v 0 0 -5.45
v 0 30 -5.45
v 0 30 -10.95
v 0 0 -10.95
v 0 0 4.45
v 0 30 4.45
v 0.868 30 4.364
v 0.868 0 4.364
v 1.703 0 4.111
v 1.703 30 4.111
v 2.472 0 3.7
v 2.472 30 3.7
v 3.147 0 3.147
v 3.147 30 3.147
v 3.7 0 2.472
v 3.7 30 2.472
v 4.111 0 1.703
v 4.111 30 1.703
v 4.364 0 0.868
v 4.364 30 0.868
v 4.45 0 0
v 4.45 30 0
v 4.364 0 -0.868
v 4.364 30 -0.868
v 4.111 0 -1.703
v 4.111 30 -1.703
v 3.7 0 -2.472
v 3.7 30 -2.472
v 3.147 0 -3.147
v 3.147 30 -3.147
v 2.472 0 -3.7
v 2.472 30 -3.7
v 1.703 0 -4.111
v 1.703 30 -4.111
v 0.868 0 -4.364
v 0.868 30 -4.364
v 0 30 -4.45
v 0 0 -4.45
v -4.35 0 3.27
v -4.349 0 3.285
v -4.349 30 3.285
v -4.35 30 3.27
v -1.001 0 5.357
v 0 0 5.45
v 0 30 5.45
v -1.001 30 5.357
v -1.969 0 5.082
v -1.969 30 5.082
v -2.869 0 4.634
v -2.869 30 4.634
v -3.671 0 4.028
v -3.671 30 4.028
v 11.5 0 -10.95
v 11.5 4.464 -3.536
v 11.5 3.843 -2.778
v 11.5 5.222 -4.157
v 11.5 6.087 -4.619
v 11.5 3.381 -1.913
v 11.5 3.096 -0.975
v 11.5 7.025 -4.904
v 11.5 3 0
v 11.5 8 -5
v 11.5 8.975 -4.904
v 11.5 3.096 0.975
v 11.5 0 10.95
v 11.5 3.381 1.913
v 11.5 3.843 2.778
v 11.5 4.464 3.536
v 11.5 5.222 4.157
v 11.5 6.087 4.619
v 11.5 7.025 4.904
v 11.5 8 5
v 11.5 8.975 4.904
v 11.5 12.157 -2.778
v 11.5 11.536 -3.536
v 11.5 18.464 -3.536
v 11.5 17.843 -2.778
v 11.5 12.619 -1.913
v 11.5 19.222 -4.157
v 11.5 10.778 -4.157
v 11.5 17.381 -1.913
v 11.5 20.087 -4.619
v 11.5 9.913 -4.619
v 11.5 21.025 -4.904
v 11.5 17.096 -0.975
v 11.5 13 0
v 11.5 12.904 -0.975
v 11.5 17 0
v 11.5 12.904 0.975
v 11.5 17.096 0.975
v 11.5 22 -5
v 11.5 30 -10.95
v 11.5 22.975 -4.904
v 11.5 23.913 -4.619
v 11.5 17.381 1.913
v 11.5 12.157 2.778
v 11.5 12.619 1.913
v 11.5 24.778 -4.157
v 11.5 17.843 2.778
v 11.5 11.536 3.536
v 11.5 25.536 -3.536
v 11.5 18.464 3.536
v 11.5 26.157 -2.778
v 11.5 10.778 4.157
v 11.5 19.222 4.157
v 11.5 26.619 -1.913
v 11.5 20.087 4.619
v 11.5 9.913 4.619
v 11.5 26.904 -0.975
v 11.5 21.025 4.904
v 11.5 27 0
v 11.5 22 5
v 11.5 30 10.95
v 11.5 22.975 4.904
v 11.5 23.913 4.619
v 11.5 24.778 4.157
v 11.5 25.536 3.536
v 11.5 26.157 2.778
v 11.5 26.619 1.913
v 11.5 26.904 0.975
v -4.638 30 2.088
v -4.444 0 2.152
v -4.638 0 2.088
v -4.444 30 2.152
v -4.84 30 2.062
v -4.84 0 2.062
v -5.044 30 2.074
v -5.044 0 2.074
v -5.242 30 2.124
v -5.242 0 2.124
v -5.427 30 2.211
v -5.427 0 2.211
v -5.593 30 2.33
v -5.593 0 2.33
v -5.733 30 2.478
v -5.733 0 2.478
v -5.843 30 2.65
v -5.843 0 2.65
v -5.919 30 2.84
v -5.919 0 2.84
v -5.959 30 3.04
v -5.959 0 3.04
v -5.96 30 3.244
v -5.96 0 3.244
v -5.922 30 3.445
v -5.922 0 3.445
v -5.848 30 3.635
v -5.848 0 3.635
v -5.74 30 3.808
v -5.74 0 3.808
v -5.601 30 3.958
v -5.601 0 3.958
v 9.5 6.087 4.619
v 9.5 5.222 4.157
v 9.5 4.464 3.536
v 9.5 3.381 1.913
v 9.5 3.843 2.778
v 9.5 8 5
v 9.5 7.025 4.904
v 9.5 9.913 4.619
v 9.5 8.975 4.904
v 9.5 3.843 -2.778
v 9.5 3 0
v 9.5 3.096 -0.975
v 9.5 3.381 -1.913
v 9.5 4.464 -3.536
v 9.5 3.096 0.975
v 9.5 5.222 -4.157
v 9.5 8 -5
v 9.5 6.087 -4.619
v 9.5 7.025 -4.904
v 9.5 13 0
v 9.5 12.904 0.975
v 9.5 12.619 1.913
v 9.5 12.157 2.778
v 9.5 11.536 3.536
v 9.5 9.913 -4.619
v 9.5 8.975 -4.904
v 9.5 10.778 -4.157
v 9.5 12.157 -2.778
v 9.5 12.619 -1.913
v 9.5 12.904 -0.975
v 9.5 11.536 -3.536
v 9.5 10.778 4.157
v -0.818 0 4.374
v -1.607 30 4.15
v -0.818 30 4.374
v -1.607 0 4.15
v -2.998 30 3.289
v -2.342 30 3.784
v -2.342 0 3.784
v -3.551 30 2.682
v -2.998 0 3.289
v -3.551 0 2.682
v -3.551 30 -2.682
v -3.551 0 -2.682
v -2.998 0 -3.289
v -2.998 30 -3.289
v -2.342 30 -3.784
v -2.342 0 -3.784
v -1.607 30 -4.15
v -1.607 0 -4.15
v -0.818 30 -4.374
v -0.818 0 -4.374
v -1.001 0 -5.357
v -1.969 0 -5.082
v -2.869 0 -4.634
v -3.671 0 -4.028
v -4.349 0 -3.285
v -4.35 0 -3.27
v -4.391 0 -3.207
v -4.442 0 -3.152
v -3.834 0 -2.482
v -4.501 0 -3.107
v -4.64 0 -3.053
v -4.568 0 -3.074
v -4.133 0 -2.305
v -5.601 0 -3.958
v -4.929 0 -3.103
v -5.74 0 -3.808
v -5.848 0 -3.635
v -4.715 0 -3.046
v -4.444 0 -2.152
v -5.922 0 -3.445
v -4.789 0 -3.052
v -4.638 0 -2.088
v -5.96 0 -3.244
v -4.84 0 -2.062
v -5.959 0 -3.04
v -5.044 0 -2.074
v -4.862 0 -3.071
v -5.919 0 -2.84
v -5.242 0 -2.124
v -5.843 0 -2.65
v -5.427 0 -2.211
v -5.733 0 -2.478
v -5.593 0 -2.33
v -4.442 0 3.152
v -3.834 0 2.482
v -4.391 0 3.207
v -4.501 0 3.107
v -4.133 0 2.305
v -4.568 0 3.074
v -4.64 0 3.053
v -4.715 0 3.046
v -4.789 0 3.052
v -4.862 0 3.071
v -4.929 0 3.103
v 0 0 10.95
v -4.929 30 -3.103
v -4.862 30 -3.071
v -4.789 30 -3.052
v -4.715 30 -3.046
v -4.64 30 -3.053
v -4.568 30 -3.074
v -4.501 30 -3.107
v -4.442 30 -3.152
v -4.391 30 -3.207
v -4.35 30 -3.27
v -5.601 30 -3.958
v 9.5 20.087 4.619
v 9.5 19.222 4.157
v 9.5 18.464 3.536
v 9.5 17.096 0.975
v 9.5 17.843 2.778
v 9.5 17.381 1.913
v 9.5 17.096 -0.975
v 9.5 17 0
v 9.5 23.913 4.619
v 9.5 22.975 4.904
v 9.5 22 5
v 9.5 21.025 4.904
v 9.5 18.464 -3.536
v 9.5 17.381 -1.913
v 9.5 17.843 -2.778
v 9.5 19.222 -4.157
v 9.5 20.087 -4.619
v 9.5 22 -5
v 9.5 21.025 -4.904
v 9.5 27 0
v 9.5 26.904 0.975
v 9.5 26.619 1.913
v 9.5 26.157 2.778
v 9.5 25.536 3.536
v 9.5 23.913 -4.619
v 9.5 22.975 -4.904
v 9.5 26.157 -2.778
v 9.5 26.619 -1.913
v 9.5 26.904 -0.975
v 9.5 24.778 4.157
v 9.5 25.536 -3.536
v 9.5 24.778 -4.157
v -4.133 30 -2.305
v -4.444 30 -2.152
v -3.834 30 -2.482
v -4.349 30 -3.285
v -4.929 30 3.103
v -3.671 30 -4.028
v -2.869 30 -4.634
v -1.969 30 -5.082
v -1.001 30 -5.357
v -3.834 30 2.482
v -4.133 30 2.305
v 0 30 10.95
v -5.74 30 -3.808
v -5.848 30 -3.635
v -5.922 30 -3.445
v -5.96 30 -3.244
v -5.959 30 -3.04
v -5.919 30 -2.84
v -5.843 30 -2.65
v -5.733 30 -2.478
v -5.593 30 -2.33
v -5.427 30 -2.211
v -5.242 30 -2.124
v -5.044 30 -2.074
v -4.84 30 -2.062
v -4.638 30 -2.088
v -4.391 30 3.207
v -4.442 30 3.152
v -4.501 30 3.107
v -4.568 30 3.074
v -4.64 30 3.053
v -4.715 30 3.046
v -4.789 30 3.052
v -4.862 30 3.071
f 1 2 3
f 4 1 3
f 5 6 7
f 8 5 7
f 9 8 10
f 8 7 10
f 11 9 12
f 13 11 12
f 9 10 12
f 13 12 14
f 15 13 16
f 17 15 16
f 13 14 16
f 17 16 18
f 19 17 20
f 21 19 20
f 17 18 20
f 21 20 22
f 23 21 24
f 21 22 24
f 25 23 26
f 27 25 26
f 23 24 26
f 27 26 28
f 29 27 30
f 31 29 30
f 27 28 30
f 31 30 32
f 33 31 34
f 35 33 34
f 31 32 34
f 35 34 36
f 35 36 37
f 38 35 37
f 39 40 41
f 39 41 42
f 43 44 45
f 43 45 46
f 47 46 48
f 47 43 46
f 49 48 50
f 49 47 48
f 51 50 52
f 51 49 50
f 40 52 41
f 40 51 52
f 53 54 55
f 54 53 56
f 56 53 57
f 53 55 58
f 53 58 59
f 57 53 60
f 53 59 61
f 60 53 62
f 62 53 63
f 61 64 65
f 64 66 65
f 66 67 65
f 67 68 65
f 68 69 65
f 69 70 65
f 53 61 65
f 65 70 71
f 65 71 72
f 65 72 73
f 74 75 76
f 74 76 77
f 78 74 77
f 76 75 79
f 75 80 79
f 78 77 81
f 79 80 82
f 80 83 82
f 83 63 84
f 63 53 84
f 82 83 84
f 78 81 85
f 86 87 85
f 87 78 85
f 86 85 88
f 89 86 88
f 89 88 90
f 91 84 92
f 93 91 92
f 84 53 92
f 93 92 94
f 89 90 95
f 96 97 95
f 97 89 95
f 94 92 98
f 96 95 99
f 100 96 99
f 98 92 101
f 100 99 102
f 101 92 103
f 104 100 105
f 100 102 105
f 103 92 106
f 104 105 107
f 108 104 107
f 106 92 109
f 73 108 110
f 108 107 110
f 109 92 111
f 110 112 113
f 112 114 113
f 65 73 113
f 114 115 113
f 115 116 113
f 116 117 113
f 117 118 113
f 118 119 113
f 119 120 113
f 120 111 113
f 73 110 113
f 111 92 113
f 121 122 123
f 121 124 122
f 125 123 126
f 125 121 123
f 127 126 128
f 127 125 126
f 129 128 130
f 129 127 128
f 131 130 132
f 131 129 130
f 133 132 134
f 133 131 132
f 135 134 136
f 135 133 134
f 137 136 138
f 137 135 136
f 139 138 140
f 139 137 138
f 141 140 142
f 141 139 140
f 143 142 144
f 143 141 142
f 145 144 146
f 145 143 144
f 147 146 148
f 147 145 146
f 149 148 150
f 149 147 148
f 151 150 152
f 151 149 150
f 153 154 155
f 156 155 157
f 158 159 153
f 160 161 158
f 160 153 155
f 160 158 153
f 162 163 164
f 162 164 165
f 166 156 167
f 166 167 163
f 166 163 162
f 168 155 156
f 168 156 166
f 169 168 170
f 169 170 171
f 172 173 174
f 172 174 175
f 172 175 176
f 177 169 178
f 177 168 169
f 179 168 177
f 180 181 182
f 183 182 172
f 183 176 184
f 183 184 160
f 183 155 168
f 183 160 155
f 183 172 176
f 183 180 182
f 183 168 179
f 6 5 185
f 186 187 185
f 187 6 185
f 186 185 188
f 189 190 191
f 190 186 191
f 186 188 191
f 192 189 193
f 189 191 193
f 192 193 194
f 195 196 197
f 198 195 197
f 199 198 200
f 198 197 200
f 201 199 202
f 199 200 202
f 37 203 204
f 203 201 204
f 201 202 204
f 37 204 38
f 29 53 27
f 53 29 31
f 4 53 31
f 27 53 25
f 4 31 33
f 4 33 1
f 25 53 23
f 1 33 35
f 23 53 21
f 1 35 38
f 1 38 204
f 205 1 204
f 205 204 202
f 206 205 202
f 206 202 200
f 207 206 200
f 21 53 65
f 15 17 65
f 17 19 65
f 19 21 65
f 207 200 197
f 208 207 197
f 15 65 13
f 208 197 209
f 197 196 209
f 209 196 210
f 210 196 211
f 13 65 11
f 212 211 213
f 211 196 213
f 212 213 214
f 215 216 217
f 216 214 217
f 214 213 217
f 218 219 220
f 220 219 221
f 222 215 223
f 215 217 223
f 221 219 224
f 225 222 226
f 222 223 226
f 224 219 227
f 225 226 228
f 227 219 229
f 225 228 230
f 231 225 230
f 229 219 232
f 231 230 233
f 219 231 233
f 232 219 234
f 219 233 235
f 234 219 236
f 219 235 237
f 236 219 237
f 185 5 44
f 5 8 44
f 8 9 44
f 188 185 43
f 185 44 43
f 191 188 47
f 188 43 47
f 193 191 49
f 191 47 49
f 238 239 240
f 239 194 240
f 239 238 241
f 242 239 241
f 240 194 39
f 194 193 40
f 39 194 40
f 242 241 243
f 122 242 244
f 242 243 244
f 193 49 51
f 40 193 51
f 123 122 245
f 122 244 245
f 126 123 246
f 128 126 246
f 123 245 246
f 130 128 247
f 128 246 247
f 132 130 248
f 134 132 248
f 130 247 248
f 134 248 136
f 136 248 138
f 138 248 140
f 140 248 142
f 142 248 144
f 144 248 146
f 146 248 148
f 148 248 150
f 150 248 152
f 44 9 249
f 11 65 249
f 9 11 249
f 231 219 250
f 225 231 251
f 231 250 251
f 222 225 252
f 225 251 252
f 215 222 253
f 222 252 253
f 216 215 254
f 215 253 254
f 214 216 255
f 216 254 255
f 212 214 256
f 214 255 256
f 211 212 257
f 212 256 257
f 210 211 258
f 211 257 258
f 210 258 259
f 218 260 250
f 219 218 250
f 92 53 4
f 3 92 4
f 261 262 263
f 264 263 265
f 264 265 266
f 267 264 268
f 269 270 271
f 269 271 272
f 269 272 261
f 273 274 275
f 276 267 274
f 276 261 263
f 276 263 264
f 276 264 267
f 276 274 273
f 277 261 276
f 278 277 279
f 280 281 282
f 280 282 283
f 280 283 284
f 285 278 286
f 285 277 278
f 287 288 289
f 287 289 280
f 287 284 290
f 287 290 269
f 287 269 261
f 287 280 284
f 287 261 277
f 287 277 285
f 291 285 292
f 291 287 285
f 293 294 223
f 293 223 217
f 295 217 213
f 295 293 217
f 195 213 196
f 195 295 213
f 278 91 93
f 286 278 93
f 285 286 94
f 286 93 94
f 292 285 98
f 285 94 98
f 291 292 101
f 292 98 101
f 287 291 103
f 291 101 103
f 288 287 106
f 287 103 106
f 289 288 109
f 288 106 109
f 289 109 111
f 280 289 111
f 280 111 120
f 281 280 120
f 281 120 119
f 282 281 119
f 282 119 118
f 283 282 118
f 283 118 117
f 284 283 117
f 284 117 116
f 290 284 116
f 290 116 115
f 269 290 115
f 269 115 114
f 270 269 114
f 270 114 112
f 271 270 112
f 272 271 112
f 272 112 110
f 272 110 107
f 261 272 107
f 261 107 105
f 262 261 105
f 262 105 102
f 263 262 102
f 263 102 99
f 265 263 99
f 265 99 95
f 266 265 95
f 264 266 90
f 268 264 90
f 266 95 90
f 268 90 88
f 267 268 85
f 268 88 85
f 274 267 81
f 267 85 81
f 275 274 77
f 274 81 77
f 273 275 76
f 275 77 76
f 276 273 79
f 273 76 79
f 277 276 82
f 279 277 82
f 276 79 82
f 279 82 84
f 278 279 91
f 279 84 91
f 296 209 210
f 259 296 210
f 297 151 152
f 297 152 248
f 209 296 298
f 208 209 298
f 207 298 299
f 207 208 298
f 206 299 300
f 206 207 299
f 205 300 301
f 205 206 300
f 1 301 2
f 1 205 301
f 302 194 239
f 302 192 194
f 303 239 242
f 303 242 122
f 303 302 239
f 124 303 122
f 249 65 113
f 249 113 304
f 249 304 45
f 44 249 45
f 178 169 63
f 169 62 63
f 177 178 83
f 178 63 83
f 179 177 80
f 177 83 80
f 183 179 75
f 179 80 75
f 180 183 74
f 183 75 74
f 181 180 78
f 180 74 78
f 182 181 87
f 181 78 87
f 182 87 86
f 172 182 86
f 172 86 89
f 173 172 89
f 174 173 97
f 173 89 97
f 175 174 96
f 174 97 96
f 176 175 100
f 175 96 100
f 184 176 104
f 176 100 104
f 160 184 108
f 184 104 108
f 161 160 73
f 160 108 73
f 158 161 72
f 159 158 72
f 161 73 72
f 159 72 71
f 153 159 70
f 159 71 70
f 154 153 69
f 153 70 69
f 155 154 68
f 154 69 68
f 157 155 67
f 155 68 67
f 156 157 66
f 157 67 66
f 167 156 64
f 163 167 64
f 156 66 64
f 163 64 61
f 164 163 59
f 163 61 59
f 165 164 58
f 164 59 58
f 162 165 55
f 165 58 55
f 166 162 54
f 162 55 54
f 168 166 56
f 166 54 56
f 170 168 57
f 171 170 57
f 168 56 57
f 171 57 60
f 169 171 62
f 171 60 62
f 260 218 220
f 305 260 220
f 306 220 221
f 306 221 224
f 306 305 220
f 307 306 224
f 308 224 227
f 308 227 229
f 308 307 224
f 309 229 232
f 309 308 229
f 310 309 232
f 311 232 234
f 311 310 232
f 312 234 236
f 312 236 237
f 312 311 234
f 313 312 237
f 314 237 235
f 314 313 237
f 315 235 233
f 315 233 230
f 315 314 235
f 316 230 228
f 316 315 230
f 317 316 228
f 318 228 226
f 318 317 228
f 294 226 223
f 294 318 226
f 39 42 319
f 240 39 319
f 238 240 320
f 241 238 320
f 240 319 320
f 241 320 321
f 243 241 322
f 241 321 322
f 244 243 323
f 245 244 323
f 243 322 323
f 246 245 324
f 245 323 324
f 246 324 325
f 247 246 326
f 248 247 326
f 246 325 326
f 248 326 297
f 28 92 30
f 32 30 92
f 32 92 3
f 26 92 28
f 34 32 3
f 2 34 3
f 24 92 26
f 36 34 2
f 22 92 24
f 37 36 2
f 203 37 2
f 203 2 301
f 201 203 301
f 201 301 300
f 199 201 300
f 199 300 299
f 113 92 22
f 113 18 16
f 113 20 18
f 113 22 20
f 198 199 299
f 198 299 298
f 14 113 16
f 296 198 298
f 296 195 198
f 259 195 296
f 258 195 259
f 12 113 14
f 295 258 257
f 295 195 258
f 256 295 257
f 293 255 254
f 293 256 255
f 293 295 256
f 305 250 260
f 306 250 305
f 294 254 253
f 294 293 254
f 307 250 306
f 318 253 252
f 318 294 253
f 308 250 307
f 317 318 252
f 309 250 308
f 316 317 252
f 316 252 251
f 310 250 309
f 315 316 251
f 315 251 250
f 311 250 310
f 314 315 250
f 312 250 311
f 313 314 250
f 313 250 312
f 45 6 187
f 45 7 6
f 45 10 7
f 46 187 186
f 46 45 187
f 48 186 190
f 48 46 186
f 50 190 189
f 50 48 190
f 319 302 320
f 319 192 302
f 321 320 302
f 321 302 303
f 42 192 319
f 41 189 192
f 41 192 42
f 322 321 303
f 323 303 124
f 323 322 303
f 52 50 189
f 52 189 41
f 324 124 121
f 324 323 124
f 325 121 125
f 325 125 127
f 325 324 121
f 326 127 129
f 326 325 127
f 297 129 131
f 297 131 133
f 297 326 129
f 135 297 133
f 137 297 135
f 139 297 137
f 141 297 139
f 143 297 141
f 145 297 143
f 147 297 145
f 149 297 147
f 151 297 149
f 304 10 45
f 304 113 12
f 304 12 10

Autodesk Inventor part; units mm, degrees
ref_plane "YZ Plane" through (0, 0, 0) normal (1, 0, 0) x (0, 1, 0)
ref_plane "XZ Plane" through (0, 0, 0) normal (0, 1, 0) x (-1, 0, 0)
ref_plane "XY Plane" through (0, 0, 0) normal (0, 0, 1) x (1, 0, 0)
sketch "Эскиз1" plane through (0, 0, 0) normal (0, 1, 0) x (-1, 0, 0)
  circle A0 centre (0, 0) radius 4.45
  circle A1 centre (0, 0) radius 5.45
  line L0 (0, 0) -> (4.349, 3.2846)
  line L1 (0, 0) -> (4.349, -3.2846)
  point P0 (3.551, -2.6819)
  point P1 (3.551, 2.6819)
  dimension "d0" = 8.9
  dimension "d1" = 10.9
extrude "Выдавливание1" add sketch "Эскиз1" along normal blind 30 contours A0 L1 A1 L0 picked at (-3.4029, -3.7722)
sketch "Эскиз2" plane through (0, 30, 0) normal (0, 1, 0) x (1, 0, 0)
  arc A0 (-3.551, -2.6819) -> (-4.4437, -2.1521) centre (-6.2523, -6.2159) ccw
  arc A1 (-4.4437, -2.1521) -> (-5.6006, -3.9578) centre (-4.878, -3.1473) ccw
  line L0 (-5.6006, -3.9578) -> (-4.9293, -3.1033)
  arc A2 (-4.3504, -3.2701) -> (-4.9293, -3.1033) centre (-4.7187, -3.4605) ccw
  line L1 (-3.551, -2.6819) -> (-4.349, -3.2846)
  line L2 (-4.349, -3.2846) -> (-3.551, -2.6819)
  line L3 (-4.349, -3.2846) -> (-4.3504, -3.2701)
  line L4 (-0.0151, 0) -> (-3.489, 0)
  arc A3 (-4.4437, 2.1521) -> (-3.551, 2.6819) centre (-6.2523, 6.2159) ccw
  arc A4 (-4.9293, 3.1033) -> (-4.3504, 3.2701) centre (-4.7187, 3.4605) ccw
  line L5 (-3.551, 2.6819) -> (-4.349, 3.2846)
  line L6 (-4.349, 3.2846) -> (-3.551, 2.6819)
  line L7 (-4.349, 3.2846) -> (-4.3504, 3.2701)
  arc A5 (-5.6006, 3.9578) -> (-4.4437, 2.1521) centre (-4.878, 3.1473) ccw
  line L8 (-5.6006, 3.9578) -> (-4.9293, 3.1033)
  point P0 (-3.551, 2.6819)
  point P1 (-4.349, -3.2846)
  point P2 (-5.3694, -4.0591)
  point P3 (-4.349, 3.2846)
  point P4 (-5.3694, 4.0591)
  point P5 (-4.349, 3.2846)
  dimension "d25" = 1.0859
sketch "Эскиз3" plane through (0, 30, 0) normal (0, 1, 0) x (1, 0, 0)
  arc A0 (-4.349, -3.2846) -> (-4.349, 3.2846) centre (0, 0) ccw projected
  line L0 (11.5, -6.95) -> (11.5, 6.95)
  arc A1 (-3.551, -2.6819) -> (-3.551, 2.6819) centre (0, 0) ccw projected
  line L1 (0, -5.45) -> (0, -4.45)
  line L2 (0, 4.45) -> (0, 5.45)
  line L3 (11.5, 6.95) -> (11.5, 10.95)
  line L4 (11.5, -6.95) -> (11.5, -10.95)
  line L5 (0, 0.95) -> (0, 5.45)
  line L6 (11.5, -10.95) -> (0, -10.95)
  line L7 (0, -10.95) -> (0, -5.45)
  line L8 (11.5, 10.95) -> (0, 10.95)
  line L9 (0, 10.95) -> (0, 5.45)
  arc A2 (0, -4.45) -> (0, 4.45) centre (0, 0) ccw
  dimension "d13" = 4
  dimension "d14" = 4
  dimension "d22" = 21.9
  dimension "d23" = 6.5
extrude "Выдавливание3" add sketch "Эскиз3" against normal blind 30
ref_plane "РабПлоскость1" through (11.5, 20, 4.95) normal (1, 0, 0) x (0, 0, -1)
sketch "Эскиз4" plane through (11.5, 20, 4.95) normal (1, 0, 0) x (0, 0, -1)
  line L0 (4.95, -20) -> (4.95, 10)
  line L1 (1, 10) -> (8.9, 10) projected
  circle A0 centre (4.95, -12) radius 5
  line L2 (14.4, -20) -> (-4.5, -20) projected
  circle A1 centre (4.95, 2) radius 5
  line L3 (-4.5, 10) -> (14.4, 10) projected
  point P0 (7.3306, 10)
  point P1 (2.5694, 10)
  point P2 (4.95, 10)
  dimension "d15" = 10
  dimension "d16" = 8
  dimension "d17" = 10
  dimension "d18" = 8
extrude "Выдавливание4" cut sketch "Эскиз4" against normal blind 2
extrude "Выдавливание5" add sketch "Эскиз2" against normal blind 30
sketch "Эскиз5" plane through (0, 30, 0) normal (0, 1, 0) x (1, 0, 0)
  arc A0 (0, 5.45) -> (-4.349, 3.2846) centre (0, 0) ccw projected
  line L0 (-4.349, 3.2846) -> (-4.3504, 3.2701) projected
  arc A1 (-4.9293, 3.1033) -> (-4.3504, 3.2701) centre (-4.7187, 3.4605) ccw projected
  line L1 (-4.9293, 3.1033) -> (-5.6006, 3.9578) projected
  arc A2 (-5.6006, 3.9578) -> (-4.4437, 2.1521) centre (-4.878, 3.1473) ccw projected
  arc A3 (-4.4437, 2.1521) -> (-3.551, 2.6819) centre (-6.2523, 6.2159) ccw projected
  arc A4 (-3.551, -2.6819) -> (-3.551, 2.6819) centre (0, 0) ccw projected
  arc A5 (-3.551, -2.6819) -> (-4.4437, -2.1521) centre (-6.2523, -6.2159) ccw projected
  arc A6 (-4.4437, -2.1521) -> (-5.6006, -3.9578) centre (-4.878, -3.1473) ccw projected
  line L2 (-5.6006, -3.9578) -> (-4.9293, -3.1033) projected
  arc A7 (-4.3504, -3.2701) -> (-4.9293, -3.1033) centre (-4.7187, -3.4605) ccw projected
  line L3 (-4.3504, -3.2701) -> (-4.349, -3.2846) projected
  arc A8 (-4.349, -3.2846) -> (0, -5.45) centre (0, 0) ccw projected
  line L4 (0, -5.45) -> (0, -10.95) projected
  line L5 (0, -10.95) -> (11.5, -10.95) projected
  line L6 (11.5, -10.95) -> (11.5, 10.95) projected
  line L7 (11.5, 10.95) -> (0, 10.95) projected
  line L8 (0, 10.95) -> (0, 5.45) projected
  line L9 (0, 4.45) -> (0, 5.45)
  line L10 (0, -4.45) -> (0, -5.45)
extrude "Выдавливание6" [suppressed]
sketch "Эскиз6" plane through (11.5, 30, 10.95) normal (1, 0, 0) x (0, 0, -1)
  arc A0 (15.95, -22) -> (15.95, -22) centre (10.95, -22) ccw projected
  arc A1 (15.95, -8) -> (15.95, -8) centre (10.95, -8) ccw projected
  point P0 (10.95, -30)
extrude "Выдавливание7" [suppressed]
properties part number "крепление маркера 9мм"
